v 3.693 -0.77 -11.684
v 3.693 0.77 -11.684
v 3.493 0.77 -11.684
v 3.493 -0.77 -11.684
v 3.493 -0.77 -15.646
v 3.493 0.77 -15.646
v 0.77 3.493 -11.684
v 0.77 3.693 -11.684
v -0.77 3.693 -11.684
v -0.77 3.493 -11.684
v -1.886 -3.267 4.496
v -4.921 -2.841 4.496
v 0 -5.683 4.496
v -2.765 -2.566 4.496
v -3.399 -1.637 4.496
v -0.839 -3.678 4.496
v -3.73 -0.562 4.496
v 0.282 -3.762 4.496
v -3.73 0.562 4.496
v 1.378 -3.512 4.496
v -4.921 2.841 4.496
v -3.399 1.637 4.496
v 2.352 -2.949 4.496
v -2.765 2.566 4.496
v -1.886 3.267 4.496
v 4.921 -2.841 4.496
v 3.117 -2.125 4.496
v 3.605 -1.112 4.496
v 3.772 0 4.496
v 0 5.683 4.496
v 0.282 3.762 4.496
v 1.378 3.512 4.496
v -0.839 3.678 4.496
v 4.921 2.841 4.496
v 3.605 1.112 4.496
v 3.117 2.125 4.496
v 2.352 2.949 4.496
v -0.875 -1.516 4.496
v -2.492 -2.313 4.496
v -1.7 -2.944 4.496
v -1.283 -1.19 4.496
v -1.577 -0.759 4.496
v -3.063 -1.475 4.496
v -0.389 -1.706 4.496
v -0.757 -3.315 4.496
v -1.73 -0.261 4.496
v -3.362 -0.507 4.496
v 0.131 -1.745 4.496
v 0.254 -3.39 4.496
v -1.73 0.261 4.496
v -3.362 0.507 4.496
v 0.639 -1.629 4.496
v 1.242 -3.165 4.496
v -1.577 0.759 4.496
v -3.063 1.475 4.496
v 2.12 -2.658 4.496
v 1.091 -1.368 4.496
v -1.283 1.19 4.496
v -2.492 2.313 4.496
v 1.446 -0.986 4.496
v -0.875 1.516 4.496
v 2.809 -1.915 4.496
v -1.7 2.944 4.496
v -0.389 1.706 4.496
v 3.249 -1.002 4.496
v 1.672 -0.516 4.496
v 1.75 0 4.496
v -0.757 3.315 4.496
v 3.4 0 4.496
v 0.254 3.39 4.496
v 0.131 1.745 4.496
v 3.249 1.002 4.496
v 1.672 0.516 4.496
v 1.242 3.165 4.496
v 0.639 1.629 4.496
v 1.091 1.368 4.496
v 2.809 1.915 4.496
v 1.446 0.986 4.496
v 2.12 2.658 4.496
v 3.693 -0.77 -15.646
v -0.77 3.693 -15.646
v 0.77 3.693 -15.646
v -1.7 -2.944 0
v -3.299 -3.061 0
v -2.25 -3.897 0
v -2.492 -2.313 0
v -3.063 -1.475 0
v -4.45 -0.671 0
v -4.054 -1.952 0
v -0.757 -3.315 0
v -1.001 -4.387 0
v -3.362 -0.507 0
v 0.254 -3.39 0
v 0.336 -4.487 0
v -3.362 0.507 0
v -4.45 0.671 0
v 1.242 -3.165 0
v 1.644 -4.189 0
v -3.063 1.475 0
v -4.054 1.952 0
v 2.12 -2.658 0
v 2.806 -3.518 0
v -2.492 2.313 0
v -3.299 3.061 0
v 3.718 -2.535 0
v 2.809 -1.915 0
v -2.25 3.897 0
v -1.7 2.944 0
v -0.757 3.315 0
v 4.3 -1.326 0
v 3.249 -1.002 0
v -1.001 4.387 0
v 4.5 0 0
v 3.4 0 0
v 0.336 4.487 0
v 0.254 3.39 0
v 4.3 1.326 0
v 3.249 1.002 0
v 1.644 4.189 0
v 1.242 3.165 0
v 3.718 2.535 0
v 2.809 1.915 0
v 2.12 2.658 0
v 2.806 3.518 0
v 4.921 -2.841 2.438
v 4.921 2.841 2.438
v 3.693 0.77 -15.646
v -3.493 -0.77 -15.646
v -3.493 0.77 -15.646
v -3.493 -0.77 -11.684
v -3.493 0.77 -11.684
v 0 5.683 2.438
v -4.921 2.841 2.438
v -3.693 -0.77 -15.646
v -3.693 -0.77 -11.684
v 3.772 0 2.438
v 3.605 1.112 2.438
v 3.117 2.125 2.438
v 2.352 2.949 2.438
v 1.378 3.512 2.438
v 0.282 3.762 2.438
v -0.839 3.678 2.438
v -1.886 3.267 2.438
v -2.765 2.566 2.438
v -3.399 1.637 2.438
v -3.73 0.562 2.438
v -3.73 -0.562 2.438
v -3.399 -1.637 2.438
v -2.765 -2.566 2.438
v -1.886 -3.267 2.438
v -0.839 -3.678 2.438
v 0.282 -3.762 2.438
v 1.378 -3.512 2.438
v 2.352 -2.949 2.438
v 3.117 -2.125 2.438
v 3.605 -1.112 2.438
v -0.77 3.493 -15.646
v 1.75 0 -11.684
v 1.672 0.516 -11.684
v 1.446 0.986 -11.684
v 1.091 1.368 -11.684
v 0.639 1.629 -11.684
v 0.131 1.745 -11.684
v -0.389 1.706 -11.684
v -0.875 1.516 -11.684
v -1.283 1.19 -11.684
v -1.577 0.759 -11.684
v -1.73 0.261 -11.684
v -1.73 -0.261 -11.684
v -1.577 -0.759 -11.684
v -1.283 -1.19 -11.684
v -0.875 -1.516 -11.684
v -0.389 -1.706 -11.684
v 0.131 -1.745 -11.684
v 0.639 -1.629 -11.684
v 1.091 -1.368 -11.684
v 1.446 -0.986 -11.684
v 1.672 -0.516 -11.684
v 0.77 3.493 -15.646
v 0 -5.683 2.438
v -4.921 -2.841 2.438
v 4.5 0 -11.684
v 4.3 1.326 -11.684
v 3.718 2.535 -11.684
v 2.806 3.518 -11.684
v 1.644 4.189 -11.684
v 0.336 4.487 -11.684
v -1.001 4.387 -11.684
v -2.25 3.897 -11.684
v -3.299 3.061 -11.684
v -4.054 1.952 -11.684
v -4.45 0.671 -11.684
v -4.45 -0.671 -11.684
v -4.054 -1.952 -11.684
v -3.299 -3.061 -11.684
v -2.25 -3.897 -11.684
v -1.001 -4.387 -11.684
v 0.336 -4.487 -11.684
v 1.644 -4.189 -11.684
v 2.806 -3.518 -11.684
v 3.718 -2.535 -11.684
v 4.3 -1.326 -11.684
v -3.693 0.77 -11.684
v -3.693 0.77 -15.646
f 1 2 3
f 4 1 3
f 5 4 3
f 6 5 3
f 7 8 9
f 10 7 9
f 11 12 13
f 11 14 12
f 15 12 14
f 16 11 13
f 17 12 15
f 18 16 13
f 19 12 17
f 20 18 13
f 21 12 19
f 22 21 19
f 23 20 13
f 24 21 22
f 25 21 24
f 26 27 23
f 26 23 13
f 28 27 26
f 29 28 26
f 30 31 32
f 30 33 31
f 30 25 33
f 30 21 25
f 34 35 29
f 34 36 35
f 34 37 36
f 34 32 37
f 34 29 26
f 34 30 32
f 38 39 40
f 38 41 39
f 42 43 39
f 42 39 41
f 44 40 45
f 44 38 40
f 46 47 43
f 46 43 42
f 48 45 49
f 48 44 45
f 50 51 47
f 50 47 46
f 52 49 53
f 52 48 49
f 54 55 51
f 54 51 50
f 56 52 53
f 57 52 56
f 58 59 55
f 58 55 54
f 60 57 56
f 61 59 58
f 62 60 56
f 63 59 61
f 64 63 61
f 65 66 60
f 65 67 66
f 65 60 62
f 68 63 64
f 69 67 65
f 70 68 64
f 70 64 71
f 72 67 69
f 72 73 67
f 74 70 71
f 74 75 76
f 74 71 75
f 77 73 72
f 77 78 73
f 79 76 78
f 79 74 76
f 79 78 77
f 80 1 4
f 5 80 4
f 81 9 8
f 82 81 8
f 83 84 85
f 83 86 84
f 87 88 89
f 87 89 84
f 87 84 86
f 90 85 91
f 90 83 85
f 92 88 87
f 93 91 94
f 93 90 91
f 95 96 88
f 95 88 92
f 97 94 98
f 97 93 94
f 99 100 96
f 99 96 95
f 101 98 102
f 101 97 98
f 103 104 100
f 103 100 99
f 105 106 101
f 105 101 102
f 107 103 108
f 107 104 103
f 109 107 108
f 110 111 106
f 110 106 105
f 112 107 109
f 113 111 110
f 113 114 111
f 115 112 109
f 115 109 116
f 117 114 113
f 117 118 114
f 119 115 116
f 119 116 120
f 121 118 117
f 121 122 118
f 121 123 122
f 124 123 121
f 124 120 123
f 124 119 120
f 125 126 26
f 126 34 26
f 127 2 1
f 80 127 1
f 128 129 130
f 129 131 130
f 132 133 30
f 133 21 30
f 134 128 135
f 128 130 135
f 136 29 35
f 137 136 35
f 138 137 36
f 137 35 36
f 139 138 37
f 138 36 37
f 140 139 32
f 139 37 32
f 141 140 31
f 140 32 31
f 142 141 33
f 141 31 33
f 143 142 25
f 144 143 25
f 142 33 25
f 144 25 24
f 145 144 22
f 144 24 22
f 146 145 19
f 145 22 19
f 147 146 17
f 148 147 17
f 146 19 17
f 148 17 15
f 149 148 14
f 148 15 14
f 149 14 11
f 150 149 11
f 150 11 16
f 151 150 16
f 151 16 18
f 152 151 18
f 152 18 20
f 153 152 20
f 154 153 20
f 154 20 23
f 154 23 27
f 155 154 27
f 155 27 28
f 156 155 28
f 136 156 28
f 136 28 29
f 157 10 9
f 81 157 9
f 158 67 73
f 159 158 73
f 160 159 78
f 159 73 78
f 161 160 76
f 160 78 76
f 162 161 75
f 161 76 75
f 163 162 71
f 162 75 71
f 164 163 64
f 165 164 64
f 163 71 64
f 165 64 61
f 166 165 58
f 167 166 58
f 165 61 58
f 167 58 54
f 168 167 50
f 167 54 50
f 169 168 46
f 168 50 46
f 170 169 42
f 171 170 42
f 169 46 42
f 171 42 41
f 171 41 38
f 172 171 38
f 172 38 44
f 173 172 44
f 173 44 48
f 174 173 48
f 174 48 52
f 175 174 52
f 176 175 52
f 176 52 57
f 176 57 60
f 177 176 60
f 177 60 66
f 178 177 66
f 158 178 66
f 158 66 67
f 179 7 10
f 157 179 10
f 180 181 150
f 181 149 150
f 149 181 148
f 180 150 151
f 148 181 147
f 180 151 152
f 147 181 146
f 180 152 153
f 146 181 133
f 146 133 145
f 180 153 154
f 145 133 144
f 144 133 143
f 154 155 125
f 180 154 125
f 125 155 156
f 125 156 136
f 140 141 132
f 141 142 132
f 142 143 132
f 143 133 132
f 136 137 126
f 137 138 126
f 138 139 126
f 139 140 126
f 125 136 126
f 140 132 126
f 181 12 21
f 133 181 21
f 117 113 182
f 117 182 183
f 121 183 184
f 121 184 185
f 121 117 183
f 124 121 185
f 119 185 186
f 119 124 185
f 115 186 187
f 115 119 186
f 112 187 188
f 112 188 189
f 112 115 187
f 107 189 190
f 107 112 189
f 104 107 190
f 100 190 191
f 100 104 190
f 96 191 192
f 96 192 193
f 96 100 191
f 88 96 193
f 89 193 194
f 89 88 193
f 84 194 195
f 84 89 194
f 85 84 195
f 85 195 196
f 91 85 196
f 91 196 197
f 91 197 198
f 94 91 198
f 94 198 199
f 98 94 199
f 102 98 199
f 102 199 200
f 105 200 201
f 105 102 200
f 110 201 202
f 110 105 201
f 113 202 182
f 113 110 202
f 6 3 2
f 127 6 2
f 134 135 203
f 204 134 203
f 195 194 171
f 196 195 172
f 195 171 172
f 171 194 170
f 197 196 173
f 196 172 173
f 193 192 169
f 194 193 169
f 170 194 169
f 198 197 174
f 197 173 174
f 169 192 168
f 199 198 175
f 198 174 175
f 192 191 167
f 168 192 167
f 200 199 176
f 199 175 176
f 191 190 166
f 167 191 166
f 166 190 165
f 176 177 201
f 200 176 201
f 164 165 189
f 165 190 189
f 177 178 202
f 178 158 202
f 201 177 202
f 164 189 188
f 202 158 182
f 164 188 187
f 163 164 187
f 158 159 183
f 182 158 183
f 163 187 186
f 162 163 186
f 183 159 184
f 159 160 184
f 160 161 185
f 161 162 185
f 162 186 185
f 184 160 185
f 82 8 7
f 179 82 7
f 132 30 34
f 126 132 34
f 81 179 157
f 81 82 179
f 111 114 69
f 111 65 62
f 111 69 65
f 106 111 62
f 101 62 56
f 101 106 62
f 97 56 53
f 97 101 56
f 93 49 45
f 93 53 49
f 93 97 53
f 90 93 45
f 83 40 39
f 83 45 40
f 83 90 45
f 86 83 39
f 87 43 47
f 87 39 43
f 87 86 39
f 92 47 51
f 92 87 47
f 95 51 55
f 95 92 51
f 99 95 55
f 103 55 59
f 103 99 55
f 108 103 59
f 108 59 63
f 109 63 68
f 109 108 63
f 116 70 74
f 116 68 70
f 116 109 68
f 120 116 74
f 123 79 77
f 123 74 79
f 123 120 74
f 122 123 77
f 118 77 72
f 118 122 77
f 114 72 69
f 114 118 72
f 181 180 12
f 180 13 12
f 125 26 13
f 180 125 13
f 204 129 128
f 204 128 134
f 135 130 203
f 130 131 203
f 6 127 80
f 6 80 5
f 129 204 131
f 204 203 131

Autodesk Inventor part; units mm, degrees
ref_plane "YZ Plane" through (0, 0, 0) normal (1, 0, 0) x (0, 1, 0)
ref_plane "XZ Plane" through (0, 0, 0) normal (0, 1, 0) x (-1, 0, 0)
ref_plane "XY Plane" through (0, 0, 0) normal (0, 0, 1) x (1, 0, 0)
sketch "Sketch1" plane through (0, 0, 0) normal (0, 0, 1) x (1, 0, 0)
  circle A0 centre (0, 0) radius 4.5
  circle A1 centre (0, 0) radius 3.4
  dimension "d0" = 9
  dimension "d1" = 6.8
extrude "Extrusion1" add sketch "Sketch1" against normal blind 11.684 contours A0 | A1
extrude "Extrusion2" add sketch "Sketch1" along normal blind 4.4958 contours A1
sketch "Sketch2" plane through (0, 0, 4.4958) normal (0, 0, 1) x (1, 0, 0)
  circle A0 centre (0, 0) radius 1.75
  dimension "d6" = 3.5
extrude "Extrusion3" cut sketch "Sketch2" against normal blind 21.4958
sketch "Sketch3" plane through (0, 0, 4.4958) normal (0, 0, 1) x (1, 0, 0)
  line L0 (4.9213, -2.8413) -> (0, -5.6826)
  line L1 (0, -5.6826) -> (-4.9213, -2.8413)
  line L2 (-4.9213, -2.8413) -> (-4.9213, 2.8413)
  line L3 (-4.9213, 2.8413) -> (0, 5.6826)
  line L4 (0, 5.6826) -> (4.9212, 2.8413)
  line L5 (4.9212, 2.8413) -> (4.9213, -2.8413)
  circle A0 centre (0, 0) radius 3.7725
  dimension "d9" = 9.8425
  dimension "d12" = 7.5451
extrude "Extrusion4" add sketch "Sketch3" against normal blind 2.0574 separate body
sketch "Sketch4" plane through (0, 0, -11.684) normal (0, 0, -1) x (-1, 0, 0)
  line L0 (-3.6931, -0.77) -> (-3.4931, -0.77)
  line L1 (-3.4931, -0.77) -> (-3.4931, 0.77)
  line L2 (-3.4931, 0.77) -> (-3.6931, 0.77)
  line L3 (-3.6931, 0.77) -> (-3.6931, -0.77)
  circle A0 centre (0, 0) radius 3.7725 projected
  line L4 (-0.77, 3.4931) -> (0.77, 3.4931)
  line L5 (0.77, 3.4931) -> (0.77, 3.6931)
  line L6 (0.77, 3.6931) -> (-0.77, 3.6931)
  line L7 (-0.77, 3.6931) -> (-0.77, 3.4931)
  line L8 (3.4931, -0.77) -> (3.6931, -0.77)
  line L9 (3.6931, -0.77) -> (3.6931, 0.77)
  line L10 (3.6931, 0.77) -> (3.4931, 0.77)
  line L11 (3.4931, 0.77) -> (3.4931, -0.77)
  point P0 (3.4931, 0)
  point P1 (-3.4931, 0)
  dimension "d13" = 0.2
  dimension "d14" = 1.54
extrude "Extrusion5" add sketch "Sketch4" along normal blind 3.9624 separate body contours L3 L2 L1 L0 | L8 L11 L10 L9 | L6 L5 L4 L7
properties part number "headphone jack"
